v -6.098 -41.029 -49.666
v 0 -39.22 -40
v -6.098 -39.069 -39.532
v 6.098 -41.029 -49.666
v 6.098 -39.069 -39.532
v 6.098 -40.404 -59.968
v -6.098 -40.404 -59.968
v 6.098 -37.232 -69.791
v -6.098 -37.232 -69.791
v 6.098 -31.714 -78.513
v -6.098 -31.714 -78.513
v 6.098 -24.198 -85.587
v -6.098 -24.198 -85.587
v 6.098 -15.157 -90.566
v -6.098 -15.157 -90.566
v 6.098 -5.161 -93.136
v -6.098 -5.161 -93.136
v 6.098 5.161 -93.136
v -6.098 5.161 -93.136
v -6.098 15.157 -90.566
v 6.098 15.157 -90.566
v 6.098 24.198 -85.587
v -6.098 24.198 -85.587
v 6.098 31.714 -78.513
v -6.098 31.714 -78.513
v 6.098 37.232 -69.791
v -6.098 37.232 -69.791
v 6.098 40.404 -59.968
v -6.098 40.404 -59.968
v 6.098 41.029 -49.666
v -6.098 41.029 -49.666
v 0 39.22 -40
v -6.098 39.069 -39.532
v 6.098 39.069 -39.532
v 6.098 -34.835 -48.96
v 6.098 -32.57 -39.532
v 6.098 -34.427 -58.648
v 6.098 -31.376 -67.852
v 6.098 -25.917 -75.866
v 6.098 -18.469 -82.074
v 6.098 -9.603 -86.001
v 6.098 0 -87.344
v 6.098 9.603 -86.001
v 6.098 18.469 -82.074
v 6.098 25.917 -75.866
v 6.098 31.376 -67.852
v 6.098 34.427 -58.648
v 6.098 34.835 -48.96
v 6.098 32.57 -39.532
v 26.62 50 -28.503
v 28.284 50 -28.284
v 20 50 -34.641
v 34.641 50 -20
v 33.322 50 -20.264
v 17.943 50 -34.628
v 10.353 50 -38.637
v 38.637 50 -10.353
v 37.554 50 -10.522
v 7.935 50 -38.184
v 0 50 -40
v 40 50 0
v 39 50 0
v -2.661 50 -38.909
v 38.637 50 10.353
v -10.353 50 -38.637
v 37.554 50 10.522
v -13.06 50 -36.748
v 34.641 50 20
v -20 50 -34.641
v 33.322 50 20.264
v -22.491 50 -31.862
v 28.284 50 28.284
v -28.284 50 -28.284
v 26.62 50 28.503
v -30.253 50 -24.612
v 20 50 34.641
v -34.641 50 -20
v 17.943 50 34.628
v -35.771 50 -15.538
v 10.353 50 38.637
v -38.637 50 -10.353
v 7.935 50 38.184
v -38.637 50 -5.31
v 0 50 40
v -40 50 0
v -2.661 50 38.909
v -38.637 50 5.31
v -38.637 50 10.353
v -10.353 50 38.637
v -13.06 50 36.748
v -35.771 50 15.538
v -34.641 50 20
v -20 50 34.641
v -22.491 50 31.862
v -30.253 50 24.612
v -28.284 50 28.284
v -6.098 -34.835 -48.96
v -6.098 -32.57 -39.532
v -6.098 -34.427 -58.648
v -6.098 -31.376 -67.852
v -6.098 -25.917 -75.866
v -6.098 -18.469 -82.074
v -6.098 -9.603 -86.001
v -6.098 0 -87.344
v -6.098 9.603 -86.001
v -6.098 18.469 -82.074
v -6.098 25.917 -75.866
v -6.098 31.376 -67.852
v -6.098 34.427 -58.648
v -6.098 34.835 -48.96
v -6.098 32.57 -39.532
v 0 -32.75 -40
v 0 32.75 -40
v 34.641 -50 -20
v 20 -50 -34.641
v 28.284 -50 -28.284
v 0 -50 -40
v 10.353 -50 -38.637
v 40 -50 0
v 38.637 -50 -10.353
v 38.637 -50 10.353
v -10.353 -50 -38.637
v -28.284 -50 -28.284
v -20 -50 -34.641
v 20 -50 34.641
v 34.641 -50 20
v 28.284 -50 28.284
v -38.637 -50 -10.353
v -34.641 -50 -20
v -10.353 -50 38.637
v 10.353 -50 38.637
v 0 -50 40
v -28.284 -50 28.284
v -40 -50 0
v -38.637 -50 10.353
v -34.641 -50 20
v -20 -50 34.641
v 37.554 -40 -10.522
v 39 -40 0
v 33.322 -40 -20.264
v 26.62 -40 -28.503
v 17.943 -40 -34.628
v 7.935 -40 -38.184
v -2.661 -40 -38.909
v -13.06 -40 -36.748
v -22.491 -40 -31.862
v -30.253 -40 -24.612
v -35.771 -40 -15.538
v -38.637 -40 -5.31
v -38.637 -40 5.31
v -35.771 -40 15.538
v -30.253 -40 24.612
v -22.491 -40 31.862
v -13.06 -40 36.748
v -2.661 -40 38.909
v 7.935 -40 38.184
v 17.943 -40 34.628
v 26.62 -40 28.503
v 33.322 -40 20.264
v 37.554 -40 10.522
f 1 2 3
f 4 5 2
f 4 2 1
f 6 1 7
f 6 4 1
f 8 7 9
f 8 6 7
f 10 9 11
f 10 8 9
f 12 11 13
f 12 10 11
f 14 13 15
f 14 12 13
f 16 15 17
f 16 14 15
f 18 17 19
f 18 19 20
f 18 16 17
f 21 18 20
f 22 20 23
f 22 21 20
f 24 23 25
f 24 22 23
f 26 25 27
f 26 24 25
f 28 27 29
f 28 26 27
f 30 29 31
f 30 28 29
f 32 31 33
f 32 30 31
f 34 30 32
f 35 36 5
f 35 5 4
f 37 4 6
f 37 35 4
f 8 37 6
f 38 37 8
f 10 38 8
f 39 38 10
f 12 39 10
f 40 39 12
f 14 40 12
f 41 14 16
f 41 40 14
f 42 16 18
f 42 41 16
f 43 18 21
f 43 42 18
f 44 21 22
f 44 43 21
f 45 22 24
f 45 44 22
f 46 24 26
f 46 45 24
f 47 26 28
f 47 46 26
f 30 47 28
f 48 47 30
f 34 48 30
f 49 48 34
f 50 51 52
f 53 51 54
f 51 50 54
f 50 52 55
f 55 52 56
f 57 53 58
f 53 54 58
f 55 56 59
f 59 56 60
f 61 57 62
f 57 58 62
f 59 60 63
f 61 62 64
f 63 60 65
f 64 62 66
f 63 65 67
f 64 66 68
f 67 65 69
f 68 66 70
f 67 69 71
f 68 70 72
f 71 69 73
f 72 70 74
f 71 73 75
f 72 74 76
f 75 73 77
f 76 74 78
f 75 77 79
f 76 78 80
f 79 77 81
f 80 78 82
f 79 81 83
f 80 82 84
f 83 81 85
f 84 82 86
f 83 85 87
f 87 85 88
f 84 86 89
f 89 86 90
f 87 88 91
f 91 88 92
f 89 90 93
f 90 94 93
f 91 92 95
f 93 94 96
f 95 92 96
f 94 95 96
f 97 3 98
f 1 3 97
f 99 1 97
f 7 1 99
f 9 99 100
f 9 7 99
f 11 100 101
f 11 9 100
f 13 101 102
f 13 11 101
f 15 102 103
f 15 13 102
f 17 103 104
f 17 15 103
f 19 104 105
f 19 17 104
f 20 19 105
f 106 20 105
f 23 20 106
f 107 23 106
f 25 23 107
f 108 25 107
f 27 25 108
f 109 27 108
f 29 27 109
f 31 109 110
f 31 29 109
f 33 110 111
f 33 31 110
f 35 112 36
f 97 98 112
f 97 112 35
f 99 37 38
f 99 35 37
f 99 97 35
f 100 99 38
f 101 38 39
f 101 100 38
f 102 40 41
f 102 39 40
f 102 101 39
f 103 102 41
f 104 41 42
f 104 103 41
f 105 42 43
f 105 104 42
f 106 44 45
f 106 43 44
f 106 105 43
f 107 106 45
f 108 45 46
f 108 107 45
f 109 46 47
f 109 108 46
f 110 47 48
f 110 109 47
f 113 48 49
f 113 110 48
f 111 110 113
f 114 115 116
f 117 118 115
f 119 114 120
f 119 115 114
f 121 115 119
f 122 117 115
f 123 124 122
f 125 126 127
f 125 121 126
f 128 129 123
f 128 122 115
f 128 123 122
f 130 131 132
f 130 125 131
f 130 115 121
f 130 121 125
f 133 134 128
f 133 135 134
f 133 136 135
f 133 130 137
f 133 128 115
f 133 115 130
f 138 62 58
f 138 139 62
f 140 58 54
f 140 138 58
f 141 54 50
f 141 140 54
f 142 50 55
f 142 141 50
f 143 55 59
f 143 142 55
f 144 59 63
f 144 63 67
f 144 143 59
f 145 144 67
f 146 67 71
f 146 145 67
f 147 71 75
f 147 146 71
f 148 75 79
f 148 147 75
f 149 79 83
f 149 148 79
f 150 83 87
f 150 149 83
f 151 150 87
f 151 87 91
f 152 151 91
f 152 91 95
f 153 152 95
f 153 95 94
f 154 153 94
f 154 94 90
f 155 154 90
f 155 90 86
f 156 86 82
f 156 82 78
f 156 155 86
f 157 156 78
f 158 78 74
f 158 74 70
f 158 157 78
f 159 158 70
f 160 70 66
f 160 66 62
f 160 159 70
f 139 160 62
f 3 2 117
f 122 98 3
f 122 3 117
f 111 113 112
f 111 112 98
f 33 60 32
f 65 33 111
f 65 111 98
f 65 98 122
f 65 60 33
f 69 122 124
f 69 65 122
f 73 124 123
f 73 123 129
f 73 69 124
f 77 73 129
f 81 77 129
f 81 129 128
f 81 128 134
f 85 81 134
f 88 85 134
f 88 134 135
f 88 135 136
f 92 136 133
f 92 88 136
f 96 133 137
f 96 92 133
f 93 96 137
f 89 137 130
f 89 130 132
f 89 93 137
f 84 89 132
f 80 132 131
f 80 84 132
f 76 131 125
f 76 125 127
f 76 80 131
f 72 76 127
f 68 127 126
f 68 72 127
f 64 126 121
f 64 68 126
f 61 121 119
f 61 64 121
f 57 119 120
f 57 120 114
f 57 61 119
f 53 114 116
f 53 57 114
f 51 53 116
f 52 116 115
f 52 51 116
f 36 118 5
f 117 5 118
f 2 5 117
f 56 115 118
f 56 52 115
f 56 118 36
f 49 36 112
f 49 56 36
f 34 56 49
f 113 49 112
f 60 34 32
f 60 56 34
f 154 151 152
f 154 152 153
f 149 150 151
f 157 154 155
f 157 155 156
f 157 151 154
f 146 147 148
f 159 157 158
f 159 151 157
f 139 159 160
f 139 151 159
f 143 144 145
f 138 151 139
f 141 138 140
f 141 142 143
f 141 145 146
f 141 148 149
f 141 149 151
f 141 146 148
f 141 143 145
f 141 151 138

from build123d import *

# Parameters (mm, degrees)
SKETCH3_W               = 40
SKETCH3_H               = 100
SKETCH8_W               = 12.19641385
SKETCH8_H               = 6.117380224
SKETCH10_R              = 39
CUT_EXTRUDE1_DEPTH      = 50
CUT_EXTRUDE1_DEPTH_BACK = 40


with BuildPart() as part:
    # Sketch3 → Revolve2 (revolve)
    with BuildSketch(Plane(origin=(0, 0, 0), x_dir=(0, 0, -1), z_dir=(1, 0, 0))):
        with Locations((20, 0)):
            Rectangle(SKETCH3_W, SKETCH3_H)
    revolve(axis=Axis((0, -50, 0), (0, 1, 0)))

    # Sweep1: sweep along a path in Sketch6
    with BuildLine(Plane(origin=(0, 0, 0), x_dir=(0, 0, -1), z_dir=(1, 0, 0))) as sweep1_path:
        CenterArc((52.344992787, 0), 38.057835552, 0, 360)
    # Sketch8 → Sweep1 (sweep)
    with BuildSketch(Plane(origin=(0, 36, -40), x_dir=(-1, 0, 0), z_dir=(0, 0.324374537, -0.945928729))):
        Rectangle(SKETCH8_W, SKETCH8_H)
    sweep(path=sweep1_path.line)

    # Sketch10 → Cut-Extrude1 (cut, two sides)
    with BuildSketch(Plane(origin=(0, 0, 0), x_dir=(1, 0, 0), z_dir=(0, 1, 0))) as cut_extrude1_sk:
        Circle(SKETCH10_R)
    extrude(amount=CUT_EXTRUDE1_DEPTH, mode=Mode.SUBTRACT)
    extrude(cut_extrude1_sk.sketch, amount=-CUT_EXTRUDE1_DEPTH_BACK, mode=Mode.SUBTRACT)


solid = part.part
